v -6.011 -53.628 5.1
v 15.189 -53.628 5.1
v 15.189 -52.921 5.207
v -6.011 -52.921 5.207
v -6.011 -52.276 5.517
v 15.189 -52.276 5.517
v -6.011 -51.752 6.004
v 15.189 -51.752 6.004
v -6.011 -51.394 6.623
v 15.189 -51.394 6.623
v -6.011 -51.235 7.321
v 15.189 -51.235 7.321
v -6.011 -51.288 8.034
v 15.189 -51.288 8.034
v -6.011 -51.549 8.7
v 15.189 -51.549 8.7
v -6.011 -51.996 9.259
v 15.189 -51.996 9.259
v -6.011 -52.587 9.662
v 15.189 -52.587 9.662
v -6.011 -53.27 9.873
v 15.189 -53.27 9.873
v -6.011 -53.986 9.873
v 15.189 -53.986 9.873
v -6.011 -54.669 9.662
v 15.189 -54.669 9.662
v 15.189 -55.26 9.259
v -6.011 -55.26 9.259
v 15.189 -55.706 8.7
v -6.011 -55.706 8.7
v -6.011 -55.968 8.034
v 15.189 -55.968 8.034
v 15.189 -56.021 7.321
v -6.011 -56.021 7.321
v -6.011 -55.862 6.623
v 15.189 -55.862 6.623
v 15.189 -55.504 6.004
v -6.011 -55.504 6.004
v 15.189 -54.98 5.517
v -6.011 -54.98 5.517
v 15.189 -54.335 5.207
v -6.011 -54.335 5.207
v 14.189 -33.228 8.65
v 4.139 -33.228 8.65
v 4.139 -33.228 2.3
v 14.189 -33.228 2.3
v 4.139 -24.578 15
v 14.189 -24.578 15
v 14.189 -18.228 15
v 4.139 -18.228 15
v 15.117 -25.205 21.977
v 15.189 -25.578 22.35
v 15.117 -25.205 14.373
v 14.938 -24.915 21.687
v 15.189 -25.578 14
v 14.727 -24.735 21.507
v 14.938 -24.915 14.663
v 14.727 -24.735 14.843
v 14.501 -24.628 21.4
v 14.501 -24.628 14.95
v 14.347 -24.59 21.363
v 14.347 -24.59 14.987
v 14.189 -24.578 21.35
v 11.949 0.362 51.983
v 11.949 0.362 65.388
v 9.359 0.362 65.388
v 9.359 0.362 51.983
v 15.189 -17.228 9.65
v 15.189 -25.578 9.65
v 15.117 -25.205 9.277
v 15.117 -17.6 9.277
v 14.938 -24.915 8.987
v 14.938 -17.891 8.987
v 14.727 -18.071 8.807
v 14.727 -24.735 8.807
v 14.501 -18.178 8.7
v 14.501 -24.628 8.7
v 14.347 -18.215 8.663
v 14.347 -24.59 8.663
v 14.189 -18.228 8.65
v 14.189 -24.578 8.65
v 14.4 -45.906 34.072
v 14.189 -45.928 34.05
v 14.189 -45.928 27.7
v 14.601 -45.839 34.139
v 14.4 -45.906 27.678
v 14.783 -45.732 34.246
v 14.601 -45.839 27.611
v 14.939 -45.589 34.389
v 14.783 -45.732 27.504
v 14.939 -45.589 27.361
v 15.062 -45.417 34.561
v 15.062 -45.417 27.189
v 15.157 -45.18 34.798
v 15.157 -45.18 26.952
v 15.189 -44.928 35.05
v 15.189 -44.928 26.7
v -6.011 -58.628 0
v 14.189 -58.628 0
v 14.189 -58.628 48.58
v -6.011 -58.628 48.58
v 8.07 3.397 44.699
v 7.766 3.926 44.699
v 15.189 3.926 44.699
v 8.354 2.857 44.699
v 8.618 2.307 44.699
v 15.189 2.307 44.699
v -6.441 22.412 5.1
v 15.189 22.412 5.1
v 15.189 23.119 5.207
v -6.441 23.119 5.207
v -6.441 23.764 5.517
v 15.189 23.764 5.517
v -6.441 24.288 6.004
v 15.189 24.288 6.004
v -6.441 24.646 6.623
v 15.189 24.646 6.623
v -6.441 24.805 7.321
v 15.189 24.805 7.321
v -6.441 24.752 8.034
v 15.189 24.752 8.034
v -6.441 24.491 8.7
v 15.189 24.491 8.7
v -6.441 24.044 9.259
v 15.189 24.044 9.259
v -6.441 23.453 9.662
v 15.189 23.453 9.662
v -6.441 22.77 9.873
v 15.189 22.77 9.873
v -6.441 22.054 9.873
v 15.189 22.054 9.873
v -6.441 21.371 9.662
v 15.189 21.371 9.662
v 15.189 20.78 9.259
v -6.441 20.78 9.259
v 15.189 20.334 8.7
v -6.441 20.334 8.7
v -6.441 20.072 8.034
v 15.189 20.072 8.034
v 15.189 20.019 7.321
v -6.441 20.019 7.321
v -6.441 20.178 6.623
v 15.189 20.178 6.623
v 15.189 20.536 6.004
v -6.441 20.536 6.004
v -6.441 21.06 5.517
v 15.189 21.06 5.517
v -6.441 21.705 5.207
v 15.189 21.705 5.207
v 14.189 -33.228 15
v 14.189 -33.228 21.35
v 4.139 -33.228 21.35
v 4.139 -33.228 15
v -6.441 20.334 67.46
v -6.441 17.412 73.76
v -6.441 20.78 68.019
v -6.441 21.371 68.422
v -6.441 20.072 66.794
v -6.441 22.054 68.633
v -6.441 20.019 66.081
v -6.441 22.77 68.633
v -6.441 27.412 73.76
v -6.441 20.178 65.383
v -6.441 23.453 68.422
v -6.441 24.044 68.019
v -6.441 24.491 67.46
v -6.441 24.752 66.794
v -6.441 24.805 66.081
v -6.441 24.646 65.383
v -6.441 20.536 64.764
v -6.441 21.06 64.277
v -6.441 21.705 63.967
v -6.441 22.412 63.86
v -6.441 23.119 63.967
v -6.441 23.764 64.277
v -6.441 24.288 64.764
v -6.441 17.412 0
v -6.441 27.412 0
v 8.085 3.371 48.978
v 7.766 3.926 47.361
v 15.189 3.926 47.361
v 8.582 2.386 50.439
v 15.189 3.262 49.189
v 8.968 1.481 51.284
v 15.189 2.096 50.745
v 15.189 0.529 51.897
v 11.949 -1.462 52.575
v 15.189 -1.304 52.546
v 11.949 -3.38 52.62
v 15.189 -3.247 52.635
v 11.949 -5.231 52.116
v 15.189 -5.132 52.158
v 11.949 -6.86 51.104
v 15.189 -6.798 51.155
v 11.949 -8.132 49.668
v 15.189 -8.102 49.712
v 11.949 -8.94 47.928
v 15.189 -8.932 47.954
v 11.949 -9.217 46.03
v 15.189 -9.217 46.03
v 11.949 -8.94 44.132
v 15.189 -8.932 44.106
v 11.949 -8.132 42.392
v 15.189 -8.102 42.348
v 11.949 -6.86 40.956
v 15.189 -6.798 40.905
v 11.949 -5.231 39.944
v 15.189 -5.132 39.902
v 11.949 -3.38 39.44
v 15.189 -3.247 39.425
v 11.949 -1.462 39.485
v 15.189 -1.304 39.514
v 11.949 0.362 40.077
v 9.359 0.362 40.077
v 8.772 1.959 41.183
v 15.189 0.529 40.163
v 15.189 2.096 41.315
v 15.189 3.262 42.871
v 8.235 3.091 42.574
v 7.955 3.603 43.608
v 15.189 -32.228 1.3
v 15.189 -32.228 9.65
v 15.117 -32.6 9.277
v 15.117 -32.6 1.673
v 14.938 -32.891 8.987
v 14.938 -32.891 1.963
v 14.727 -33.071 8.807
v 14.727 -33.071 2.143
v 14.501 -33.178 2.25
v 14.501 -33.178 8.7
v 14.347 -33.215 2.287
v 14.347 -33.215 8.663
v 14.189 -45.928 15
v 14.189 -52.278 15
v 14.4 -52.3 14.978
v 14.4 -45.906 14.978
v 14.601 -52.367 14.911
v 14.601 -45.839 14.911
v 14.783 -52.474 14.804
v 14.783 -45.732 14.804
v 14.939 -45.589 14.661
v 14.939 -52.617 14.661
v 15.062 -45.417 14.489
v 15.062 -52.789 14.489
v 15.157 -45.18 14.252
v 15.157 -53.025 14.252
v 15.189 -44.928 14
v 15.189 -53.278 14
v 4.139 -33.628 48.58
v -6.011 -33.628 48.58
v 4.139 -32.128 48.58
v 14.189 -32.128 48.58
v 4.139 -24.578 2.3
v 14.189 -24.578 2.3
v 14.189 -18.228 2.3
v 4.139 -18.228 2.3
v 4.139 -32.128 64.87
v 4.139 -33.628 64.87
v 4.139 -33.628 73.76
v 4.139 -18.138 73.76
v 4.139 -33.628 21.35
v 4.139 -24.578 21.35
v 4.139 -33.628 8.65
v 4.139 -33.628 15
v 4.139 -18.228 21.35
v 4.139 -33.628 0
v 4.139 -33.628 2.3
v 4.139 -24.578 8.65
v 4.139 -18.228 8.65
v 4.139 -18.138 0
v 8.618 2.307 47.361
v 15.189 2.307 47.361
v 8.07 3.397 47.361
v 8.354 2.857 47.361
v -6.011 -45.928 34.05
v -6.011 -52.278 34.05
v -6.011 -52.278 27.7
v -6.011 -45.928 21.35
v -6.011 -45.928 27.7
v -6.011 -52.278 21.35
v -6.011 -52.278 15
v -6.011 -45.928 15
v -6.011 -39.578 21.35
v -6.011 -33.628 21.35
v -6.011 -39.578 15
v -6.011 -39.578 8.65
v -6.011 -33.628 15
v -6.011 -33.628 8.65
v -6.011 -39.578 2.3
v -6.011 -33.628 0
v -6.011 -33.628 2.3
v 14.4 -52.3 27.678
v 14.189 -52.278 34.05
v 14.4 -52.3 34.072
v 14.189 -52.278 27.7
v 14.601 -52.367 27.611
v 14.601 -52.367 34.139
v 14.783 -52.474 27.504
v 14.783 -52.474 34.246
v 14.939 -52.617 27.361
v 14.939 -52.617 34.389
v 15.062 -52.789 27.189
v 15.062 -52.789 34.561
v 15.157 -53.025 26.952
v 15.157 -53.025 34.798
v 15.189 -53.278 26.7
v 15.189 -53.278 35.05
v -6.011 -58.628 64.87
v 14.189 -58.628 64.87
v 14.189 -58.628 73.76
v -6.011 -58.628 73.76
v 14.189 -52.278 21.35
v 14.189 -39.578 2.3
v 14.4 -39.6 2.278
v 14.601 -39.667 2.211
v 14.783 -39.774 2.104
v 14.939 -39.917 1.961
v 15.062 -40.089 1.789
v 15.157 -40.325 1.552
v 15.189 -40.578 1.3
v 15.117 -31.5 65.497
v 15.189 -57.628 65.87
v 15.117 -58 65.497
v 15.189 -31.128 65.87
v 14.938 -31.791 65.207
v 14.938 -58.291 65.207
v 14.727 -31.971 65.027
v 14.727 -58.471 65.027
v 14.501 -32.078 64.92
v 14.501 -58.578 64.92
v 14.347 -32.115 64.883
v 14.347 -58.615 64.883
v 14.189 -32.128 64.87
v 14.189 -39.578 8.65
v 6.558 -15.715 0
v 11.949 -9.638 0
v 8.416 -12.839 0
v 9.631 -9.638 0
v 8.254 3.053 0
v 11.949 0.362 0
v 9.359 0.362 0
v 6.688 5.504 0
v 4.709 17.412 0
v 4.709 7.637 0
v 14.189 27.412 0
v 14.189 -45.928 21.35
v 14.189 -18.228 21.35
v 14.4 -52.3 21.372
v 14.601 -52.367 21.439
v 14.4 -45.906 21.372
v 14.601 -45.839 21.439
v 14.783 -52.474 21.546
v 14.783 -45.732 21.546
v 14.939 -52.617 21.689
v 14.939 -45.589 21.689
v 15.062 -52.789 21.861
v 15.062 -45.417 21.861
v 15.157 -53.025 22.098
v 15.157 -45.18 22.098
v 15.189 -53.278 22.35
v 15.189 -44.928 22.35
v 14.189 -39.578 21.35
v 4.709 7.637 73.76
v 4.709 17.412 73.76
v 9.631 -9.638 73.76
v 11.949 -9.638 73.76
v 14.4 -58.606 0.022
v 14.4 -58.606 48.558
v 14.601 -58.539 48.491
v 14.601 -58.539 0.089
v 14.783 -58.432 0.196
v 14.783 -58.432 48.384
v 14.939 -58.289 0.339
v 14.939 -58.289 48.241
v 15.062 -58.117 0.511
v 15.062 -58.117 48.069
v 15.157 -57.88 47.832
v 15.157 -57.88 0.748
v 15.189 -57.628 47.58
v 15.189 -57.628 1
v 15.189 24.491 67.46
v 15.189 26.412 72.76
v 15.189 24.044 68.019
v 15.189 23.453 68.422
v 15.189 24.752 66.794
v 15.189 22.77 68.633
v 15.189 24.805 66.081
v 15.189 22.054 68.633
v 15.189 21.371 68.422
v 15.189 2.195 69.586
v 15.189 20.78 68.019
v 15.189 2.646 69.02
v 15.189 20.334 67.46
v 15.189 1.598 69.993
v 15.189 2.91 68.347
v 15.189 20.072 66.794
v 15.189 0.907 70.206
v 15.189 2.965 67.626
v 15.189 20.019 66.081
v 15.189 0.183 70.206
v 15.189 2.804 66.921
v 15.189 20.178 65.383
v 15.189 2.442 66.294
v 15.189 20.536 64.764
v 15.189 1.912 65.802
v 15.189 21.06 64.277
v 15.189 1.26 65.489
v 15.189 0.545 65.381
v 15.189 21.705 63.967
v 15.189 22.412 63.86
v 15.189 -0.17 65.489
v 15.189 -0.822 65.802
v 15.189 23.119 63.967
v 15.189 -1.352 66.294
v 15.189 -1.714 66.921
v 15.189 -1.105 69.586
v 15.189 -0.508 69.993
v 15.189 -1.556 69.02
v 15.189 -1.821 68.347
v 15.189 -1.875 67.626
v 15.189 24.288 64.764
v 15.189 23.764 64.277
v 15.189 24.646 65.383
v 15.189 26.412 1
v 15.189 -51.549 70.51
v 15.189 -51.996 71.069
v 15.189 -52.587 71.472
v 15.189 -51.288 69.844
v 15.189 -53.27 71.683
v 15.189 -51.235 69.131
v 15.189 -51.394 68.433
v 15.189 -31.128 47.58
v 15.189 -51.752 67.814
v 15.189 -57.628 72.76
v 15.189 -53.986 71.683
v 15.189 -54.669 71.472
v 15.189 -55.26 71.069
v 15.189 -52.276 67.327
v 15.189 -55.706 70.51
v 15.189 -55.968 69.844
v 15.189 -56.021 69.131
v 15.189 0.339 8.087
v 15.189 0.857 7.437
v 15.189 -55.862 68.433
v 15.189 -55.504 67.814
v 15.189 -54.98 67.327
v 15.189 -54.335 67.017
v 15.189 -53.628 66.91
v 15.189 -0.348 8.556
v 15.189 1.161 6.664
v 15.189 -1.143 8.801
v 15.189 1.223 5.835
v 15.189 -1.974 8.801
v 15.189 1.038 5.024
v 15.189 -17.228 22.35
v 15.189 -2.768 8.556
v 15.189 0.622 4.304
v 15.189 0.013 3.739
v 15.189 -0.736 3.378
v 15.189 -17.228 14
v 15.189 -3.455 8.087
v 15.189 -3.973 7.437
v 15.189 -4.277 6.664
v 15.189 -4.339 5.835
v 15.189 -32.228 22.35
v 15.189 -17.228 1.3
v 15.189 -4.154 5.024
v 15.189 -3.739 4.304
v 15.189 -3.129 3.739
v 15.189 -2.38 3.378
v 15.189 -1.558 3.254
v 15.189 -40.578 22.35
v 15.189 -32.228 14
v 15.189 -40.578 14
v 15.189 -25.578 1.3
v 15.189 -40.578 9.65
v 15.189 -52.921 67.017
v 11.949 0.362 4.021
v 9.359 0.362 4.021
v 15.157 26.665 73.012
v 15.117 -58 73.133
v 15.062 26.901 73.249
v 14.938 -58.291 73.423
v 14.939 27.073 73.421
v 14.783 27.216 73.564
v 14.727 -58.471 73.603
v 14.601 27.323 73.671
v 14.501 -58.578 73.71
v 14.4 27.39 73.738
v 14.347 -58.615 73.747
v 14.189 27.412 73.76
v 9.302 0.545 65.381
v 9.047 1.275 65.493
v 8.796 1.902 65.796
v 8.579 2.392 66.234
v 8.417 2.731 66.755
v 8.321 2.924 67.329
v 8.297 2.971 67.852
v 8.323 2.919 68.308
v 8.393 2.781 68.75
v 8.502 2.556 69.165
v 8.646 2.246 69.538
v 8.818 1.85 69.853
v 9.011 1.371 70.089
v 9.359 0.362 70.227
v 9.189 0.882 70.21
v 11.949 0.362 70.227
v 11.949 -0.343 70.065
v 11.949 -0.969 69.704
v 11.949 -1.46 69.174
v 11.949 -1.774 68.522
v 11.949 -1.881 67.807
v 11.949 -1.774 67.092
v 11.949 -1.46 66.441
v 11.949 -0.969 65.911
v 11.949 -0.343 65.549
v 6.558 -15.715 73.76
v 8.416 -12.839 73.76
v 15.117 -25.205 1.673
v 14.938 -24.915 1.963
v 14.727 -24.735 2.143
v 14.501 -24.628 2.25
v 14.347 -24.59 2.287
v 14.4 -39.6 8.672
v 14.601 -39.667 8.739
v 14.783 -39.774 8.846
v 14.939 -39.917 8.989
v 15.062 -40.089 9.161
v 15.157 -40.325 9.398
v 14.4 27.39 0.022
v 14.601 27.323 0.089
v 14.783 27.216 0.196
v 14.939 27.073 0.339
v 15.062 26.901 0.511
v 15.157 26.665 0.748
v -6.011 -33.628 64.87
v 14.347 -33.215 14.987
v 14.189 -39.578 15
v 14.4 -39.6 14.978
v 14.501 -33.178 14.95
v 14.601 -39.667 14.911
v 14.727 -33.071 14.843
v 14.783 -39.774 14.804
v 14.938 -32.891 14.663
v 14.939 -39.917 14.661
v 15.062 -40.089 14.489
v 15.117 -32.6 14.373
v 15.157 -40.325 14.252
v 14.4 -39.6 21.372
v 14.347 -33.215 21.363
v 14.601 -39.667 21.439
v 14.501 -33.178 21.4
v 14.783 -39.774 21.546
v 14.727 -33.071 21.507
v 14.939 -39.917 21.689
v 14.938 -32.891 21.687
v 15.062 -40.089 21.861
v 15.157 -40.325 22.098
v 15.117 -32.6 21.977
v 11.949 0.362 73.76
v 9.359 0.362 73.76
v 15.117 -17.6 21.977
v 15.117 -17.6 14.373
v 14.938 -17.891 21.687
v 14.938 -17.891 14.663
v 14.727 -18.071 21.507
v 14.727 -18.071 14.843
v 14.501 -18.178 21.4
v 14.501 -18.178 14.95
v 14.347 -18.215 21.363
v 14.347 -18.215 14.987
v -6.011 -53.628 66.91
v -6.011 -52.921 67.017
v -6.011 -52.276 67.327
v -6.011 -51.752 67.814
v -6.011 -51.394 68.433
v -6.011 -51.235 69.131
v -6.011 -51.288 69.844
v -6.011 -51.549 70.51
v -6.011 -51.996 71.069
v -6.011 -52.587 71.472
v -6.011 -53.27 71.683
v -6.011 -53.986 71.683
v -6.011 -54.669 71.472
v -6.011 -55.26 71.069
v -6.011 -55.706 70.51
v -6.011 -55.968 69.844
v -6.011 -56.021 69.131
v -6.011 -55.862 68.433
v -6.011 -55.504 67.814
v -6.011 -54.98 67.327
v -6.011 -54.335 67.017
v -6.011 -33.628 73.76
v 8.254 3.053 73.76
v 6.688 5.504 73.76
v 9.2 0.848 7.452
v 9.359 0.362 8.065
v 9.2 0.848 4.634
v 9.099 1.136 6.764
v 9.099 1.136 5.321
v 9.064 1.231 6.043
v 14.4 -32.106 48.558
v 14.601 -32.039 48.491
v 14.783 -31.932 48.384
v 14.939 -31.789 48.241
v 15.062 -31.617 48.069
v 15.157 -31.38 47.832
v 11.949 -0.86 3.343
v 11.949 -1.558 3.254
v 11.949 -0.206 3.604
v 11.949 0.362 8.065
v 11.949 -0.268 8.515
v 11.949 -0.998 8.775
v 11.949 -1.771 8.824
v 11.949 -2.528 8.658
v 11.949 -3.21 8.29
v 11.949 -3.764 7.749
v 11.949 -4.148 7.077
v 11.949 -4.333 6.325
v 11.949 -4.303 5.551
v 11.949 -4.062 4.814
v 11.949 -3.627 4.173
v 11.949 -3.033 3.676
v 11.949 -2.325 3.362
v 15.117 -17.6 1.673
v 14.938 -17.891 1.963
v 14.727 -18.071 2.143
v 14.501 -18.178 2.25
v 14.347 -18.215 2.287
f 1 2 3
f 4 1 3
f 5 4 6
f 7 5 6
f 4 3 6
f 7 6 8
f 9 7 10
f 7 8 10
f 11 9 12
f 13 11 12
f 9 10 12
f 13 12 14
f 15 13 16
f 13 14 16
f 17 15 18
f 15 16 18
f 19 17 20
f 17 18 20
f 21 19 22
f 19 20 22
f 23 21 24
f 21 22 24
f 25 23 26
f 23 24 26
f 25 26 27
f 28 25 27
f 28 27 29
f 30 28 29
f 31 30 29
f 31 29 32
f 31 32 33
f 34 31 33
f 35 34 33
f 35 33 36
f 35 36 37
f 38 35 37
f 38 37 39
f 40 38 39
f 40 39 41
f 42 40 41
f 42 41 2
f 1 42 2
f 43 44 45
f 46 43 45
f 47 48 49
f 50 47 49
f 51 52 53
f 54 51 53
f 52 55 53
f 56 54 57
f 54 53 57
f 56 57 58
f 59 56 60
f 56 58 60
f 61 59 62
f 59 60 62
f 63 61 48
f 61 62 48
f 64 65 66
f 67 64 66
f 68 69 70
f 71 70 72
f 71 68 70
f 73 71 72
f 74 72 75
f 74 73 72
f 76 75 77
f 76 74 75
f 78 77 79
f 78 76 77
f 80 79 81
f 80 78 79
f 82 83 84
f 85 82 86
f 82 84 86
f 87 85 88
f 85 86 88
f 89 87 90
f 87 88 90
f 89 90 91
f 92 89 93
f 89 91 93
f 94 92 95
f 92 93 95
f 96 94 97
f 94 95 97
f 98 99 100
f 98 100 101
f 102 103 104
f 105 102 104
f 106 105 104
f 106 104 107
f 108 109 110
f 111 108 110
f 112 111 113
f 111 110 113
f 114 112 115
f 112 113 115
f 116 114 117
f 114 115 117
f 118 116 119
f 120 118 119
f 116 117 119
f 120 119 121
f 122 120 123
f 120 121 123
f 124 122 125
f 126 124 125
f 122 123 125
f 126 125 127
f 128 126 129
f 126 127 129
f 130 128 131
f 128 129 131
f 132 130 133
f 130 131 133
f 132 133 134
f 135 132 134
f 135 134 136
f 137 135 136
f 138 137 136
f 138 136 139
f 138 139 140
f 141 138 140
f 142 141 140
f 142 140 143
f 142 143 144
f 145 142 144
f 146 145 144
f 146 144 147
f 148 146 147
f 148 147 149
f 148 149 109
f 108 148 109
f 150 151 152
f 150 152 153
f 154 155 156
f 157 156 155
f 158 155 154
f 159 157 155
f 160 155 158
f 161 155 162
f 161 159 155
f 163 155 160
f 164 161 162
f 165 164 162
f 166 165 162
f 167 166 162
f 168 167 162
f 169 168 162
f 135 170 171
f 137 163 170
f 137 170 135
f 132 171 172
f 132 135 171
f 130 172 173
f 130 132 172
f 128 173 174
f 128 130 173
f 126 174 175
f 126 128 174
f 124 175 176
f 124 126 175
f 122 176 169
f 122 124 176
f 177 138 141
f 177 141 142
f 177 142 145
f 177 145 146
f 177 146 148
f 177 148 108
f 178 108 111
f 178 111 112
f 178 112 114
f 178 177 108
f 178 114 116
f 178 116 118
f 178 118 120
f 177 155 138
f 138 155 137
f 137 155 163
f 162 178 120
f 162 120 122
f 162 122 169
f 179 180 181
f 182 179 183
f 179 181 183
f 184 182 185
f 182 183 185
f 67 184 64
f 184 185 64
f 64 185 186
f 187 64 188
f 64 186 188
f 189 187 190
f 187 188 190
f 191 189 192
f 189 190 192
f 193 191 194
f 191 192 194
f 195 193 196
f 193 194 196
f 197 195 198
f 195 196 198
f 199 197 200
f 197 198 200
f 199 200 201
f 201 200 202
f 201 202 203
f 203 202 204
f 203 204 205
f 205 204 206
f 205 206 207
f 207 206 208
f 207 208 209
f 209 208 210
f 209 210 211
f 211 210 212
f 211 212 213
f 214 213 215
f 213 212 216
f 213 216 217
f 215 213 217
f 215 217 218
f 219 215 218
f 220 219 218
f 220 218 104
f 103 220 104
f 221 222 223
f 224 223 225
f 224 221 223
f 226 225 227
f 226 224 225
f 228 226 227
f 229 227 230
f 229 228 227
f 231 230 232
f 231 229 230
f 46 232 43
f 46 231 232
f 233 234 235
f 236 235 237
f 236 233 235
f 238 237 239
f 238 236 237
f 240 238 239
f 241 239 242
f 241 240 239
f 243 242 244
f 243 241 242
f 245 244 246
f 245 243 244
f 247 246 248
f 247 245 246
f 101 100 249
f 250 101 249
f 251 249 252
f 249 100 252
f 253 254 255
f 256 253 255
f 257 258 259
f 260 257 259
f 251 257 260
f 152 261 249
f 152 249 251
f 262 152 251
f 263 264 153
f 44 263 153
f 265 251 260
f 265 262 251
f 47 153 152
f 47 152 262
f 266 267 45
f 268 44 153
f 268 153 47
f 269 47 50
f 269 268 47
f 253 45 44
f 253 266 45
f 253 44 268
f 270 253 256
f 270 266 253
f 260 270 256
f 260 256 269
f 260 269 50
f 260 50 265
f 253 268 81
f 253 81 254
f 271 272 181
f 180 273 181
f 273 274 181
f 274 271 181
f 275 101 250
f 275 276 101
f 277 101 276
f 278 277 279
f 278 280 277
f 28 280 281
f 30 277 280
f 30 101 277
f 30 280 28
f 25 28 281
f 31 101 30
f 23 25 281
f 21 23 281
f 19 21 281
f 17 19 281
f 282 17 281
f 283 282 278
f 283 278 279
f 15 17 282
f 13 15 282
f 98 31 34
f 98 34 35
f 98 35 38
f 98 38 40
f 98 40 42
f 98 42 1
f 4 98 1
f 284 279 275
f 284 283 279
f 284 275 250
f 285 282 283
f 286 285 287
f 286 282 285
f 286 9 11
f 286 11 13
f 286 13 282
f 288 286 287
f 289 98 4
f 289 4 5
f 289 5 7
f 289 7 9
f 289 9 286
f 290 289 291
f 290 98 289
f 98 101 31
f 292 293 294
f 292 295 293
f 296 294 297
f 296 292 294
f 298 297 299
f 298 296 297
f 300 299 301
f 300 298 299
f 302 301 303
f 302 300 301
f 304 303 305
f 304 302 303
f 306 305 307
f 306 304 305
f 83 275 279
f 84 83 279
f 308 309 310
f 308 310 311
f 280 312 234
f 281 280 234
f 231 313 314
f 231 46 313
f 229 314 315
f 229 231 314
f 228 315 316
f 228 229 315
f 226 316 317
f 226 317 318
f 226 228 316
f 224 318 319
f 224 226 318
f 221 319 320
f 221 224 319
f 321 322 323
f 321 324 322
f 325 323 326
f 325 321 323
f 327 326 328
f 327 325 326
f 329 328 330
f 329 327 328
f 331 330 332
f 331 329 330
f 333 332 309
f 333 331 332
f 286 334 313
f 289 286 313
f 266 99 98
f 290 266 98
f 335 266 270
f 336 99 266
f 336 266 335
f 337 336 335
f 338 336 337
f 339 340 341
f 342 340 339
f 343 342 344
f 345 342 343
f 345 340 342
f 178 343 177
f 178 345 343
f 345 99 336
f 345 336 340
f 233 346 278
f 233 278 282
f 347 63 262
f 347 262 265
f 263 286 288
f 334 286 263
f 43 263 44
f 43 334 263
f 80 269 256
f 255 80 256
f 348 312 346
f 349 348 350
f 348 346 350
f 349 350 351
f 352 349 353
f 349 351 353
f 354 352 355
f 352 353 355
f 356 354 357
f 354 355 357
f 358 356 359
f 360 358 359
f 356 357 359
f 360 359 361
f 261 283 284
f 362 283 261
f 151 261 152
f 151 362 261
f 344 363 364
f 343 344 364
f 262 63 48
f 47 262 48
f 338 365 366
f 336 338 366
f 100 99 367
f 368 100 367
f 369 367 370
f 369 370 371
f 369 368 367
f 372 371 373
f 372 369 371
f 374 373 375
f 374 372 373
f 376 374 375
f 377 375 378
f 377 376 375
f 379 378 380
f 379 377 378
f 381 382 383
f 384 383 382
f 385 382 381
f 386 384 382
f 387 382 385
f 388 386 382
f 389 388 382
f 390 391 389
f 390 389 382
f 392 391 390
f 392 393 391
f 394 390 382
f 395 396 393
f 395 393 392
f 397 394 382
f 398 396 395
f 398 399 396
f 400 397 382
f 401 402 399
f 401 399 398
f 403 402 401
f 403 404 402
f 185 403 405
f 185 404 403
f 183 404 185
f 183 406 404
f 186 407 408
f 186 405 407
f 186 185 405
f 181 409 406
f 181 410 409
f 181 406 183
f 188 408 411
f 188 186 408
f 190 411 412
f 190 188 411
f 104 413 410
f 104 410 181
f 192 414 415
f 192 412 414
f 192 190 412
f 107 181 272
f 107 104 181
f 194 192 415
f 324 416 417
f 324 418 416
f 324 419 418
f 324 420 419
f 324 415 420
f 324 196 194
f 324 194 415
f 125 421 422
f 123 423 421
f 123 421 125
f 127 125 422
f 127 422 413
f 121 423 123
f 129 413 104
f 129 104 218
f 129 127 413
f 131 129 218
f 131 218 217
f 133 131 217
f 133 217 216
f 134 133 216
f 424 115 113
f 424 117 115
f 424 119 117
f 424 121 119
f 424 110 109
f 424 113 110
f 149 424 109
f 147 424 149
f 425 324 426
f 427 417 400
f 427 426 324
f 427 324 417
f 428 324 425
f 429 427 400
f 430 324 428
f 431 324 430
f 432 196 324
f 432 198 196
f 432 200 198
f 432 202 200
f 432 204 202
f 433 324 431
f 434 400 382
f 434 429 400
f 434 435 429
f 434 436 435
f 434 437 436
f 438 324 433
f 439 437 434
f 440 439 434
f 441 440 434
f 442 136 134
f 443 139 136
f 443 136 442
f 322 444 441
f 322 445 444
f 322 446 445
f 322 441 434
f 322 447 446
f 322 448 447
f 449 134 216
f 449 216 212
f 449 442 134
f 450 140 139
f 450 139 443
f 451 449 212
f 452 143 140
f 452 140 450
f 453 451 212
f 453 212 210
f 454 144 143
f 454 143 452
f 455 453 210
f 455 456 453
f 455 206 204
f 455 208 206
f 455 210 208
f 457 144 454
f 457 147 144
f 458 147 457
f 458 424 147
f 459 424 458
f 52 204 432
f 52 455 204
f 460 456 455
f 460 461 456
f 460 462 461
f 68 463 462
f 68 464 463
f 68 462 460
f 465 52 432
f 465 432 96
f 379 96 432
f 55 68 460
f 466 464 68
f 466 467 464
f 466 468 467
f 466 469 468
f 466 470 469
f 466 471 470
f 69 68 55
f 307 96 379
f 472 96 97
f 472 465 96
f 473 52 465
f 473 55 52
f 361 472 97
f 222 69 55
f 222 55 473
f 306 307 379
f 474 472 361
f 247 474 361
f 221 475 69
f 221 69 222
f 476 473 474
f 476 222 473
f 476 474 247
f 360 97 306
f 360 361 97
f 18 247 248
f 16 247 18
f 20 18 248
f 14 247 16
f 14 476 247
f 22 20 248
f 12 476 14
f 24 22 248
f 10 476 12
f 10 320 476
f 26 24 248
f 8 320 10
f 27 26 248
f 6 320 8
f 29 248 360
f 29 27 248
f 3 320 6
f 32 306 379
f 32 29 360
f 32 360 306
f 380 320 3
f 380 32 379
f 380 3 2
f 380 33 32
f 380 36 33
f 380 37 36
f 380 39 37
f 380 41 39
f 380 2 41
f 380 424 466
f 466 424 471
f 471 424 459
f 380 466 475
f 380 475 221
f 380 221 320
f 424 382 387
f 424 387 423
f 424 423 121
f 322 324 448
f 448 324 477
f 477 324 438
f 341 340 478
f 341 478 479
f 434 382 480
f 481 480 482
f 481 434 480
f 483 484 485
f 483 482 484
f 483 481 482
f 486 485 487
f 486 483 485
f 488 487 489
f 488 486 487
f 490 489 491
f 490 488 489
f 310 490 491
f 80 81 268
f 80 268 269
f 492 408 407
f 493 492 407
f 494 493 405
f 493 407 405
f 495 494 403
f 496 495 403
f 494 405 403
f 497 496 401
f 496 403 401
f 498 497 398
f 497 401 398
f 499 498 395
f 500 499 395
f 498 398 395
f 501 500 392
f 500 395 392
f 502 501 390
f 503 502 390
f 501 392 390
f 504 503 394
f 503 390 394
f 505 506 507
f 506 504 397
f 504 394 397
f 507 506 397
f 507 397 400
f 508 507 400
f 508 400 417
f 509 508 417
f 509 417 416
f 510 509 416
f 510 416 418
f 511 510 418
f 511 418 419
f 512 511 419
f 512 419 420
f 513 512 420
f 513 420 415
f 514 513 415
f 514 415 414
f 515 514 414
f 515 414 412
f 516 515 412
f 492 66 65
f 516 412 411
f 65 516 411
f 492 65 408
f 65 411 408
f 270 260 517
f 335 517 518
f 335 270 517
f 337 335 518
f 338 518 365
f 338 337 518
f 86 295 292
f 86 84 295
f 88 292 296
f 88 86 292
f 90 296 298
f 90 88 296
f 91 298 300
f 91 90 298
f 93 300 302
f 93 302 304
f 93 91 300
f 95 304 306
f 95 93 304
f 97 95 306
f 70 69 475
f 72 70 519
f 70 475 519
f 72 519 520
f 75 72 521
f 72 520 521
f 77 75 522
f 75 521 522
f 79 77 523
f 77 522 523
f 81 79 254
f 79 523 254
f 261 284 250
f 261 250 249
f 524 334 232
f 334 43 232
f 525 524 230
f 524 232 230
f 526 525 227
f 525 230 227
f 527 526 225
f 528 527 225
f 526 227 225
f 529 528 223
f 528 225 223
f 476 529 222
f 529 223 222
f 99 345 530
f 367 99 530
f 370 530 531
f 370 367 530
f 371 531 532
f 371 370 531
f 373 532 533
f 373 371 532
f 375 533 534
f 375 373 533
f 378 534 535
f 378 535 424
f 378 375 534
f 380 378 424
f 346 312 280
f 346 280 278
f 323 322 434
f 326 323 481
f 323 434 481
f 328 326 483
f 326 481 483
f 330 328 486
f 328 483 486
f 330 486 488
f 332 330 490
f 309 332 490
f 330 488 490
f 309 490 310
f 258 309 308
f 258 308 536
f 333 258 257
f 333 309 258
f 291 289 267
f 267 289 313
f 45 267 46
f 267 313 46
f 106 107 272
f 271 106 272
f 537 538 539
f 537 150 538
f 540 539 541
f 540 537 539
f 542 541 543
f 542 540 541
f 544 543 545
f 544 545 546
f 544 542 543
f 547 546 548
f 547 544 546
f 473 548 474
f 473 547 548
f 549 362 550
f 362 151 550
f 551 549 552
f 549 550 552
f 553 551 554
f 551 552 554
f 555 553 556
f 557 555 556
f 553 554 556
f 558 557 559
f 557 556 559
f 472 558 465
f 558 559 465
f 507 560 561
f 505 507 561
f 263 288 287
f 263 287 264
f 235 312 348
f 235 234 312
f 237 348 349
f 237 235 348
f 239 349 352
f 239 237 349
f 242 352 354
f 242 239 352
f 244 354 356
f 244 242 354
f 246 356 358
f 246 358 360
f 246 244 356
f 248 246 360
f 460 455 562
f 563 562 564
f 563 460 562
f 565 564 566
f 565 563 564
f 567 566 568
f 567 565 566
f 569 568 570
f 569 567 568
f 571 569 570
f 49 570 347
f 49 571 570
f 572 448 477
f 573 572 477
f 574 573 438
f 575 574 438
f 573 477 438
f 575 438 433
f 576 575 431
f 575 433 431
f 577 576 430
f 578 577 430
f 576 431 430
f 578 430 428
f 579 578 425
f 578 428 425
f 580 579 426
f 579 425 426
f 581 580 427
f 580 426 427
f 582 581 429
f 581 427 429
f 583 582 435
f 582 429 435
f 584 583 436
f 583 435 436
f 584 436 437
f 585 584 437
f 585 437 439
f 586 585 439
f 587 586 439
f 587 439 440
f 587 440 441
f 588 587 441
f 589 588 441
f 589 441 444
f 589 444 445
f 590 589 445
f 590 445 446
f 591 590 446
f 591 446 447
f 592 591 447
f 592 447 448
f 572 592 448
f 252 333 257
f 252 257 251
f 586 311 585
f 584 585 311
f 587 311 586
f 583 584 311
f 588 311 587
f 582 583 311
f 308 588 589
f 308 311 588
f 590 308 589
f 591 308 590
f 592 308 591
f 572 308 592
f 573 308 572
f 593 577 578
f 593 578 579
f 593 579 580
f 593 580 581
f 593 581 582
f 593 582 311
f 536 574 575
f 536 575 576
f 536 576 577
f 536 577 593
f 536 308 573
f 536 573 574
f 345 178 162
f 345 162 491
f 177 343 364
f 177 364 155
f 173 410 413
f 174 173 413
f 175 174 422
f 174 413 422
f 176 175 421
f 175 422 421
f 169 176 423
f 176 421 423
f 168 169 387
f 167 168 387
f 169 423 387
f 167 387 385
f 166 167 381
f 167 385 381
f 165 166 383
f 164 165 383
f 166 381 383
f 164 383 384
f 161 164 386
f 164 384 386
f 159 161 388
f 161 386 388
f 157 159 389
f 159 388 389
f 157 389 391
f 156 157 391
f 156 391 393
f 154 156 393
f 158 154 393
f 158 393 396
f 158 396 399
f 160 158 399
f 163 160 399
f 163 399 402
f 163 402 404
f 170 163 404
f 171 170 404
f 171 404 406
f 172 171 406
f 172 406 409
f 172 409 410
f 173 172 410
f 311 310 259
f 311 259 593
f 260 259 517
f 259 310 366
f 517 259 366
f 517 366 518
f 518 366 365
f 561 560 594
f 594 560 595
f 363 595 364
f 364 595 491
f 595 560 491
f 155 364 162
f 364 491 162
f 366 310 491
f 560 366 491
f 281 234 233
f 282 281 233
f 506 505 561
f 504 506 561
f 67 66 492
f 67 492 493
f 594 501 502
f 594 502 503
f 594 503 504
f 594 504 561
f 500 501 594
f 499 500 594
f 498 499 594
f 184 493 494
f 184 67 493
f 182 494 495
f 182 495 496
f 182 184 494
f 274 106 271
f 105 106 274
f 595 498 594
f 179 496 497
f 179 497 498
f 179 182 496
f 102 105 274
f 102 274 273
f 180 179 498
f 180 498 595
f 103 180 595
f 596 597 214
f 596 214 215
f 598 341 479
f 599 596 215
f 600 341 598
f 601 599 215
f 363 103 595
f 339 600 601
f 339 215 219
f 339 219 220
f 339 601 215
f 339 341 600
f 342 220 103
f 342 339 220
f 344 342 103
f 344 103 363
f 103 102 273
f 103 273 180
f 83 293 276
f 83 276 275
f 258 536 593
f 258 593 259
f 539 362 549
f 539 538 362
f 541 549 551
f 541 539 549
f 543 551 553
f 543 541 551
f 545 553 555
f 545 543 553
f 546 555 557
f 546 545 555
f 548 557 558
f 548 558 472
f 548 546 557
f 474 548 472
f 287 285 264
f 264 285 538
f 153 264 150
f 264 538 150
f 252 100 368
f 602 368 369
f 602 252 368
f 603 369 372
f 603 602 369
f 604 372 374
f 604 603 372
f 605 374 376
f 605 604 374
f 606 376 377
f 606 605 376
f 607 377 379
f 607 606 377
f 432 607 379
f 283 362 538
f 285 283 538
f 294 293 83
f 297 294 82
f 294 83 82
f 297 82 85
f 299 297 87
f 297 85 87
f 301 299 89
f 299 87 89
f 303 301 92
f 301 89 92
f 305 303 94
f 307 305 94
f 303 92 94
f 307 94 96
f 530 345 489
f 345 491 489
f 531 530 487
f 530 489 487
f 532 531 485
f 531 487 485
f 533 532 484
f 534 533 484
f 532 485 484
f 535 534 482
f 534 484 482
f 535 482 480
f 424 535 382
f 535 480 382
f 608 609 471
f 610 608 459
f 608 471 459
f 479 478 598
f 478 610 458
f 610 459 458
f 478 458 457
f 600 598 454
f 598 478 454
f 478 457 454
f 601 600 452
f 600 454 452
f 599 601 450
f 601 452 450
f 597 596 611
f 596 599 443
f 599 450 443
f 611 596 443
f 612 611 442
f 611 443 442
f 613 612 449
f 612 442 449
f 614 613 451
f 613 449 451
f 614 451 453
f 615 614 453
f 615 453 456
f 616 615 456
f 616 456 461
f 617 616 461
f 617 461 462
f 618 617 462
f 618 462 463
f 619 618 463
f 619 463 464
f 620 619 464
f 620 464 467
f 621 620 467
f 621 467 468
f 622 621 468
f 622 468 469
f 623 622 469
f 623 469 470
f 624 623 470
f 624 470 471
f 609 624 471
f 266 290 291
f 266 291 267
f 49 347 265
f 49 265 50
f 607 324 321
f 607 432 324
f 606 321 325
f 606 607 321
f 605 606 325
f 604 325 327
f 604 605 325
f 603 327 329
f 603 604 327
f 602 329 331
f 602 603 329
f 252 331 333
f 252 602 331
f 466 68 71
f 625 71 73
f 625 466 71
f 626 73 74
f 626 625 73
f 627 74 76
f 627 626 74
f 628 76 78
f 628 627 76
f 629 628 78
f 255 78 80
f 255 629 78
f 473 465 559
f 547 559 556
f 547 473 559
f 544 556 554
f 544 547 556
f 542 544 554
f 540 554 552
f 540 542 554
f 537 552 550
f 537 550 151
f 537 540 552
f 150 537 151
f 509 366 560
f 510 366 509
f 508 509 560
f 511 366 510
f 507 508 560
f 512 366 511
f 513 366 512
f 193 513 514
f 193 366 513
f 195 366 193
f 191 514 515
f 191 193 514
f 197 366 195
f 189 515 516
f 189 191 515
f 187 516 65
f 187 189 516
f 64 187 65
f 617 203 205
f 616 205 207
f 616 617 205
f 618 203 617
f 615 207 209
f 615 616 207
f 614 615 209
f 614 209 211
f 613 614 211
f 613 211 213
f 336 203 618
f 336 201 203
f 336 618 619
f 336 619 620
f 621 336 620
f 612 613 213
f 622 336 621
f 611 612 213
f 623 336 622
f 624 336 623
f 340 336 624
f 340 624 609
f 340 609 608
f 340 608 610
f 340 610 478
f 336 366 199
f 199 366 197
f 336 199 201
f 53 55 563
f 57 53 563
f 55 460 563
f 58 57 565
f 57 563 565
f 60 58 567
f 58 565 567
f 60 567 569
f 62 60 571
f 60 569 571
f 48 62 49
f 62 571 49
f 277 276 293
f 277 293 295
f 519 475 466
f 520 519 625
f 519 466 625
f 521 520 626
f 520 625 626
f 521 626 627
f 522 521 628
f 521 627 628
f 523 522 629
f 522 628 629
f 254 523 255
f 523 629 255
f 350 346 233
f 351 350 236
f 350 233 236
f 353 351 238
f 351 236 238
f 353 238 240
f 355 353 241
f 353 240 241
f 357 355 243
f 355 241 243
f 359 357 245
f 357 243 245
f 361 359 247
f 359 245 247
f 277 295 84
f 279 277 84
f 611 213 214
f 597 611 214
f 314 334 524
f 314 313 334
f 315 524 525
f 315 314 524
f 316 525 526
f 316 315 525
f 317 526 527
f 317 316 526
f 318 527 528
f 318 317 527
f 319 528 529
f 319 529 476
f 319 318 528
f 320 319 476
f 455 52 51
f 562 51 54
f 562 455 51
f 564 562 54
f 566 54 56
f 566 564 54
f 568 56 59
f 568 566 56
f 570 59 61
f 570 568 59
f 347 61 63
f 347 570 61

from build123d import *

# Parameters (mm, degrees)
PROFILEEXTRUDE_DEPTH = 73.76
HOSEWINDOW_W         = 16.29
HOSEWINDOW_H         = 26.5
HOSEWINDOWCUT_DEPTH  = 22.63
CAGESCREWS_R         = 2.4
CAGESCREWSCUT_DEPTH  = 22.63
AXLEHOLECUT_DEPTH    = 22.63
SETSCREWS_R          = 2.426338021
SETSCREWS_R_2        = 2.788762315
SETSCREWSCUT_DEPTH   = 22.63
SKETCH1_W            = 6.35
SKETCH1_H            = 6.35
CUT_EXTRUDE1_DEPTH   = 22.63
FILLET1_R            = 1


with BuildPart() as part:
    # Profile → ProfileExtrude (new body)
    with BuildSketch(Plane.XY):
        with BuildLine():
            Line((-6.01073477, -58.62791746), (-6.01073477, -33.62791746))
            Line((-6.01073477, -33.62791746), (4.13926523, -33.62791746))
            Line((4.13926523, -33.62791746), (4.13926523, -18.13791746))
            ThreePointArc((4.13926523, -18.13791746), (7.563334043, -14.326029686), (9.63126523, -9.63791746))
            Line((9.63126523, -9.63791746), (11.94926523, -9.63791746))
            Line((11.94926523, -9.63791746), (11.94926523, 0.36208254))
            Line((11.94926523, 0.36208254), (9.35926523, 0.36208254))
            ThreePointArc((9.35926523, 0.36208254), (7.525939238, 4.313848402), (4.70926523, 7.63708254))
            Line((4.70926523, 7.63708254), (4.70926523, 17.41208254))
            Line((4.70926523, 17.41208254), (-6.44073477, 17.41208254))
            Line((-6.44073477, 17.41208254), (-6.44073477, 27.41208254))
            Line((-6.44073477, 27.41208254), (15.18926523, 27.41208254))
            Line((15.18926523, 27.41208254), (15.18926523, -58.62791746))
            Line((15.18926523, -58.62791746), (-6.01073477, -58.62791746))
        make_face()
    extrude(amount=PROFILEEXTRUDE_DEPTH)

    # HoseWindow → HoseWindowCut (cut, through all)
    with BuildSketch(Plane(origin=(15.18926523, 0, 0), x_dir=(0, 0, -1), z_dir=(1, 0, 0))):
        with Locations((-56.725, -45.37791746)):
            Rectangle(HOSEWINDOW_W, HOSEWINDOW_H)
    extrude(amount=-HOSEWINDOWCUT_DEPTH, mode=Mode.SUBTRACT)

    # CageScrews → CageScrewsCut (cut, through all)
    with BuildSketch(Plane(origin=(15.18926523, 0, 0), x_dir=(0, 0, -1), z_dir=(1, 0, 0))):
        with Locations((-66.26, 22.41208254)):
            Circle(CAGESCREWS_R)
        with Locations((-7.5, 22.41208254)):
            Circle(CAGESCREWS_R)
        with Locations((-7.5, -53.62791746)):
            Circle(CAGESCREWS_R)
        with Locations((-69.31, -53.62791746)):
            Circle(CAGESCREWS_R)
    extrude(amount=-CAGESCREWSCUT_DEPTH, mode=Mode.SUBTRACT)

    # AxleHole → AxleHoleCut (cut, through all)
    with BuildSketch(Plane(origin=(15.18926523, 0, 0), x_dir=(0, 0, -1), z_dir=(1, 0, 0))):
        with BuildLine():
            Line((-44.699, 2.307293484), (-47.361, 2.307293484))
            Line((-47.361, 2.307293484), (-47.361, 3.926293484))
            ThreePointArc((-47.361, 3.926293484), (-46.03, -9.21691746), (-44.699, 3.926293484))
            Line((-44.699, 3.926293484), (-44.699, 2.307293484))
        make_face()
    extrude(amount=-AXLEHOLECUT_DEPTH, mode=Mode.SUBTRACT)

    # SetScrews → SetScrewsCut (cut, through all)
    with BuildSketch(Plane(origin=(15.18926523, 0, 0), x_dir=(0, 0, -1), z_dir=(1, 0, 0))):
        with Locations((-67.80722939, 0.544946624)):
            Circle(SETSCREWS_R)
        with Locations((-6.04299884, -1.55824191)):
            Circle(SETSCREWS_R_2)
    extrude(amount=-SETSCREWSCUT_DEPTH, mode=Mode.SUBTRACT)

    # Sketch1 → Cut-Extrude1 (cut, through all)
    with BuildSketch(Plane(origin=(15.18926523, 0, 0), x_dir=(0, 0, -1), z_dir=(1, 0, 0))):
        with Locations((-18.175, -49.10291746)):
            Rectangle(SKETCH1_W, SKETCH1_H)
        with Locations((-30.875, -49.10291746)):
            Rectangle(SKETCH1_W, SKETCH1_H)
        with Locations((-5.475, -36.40291746)):
            Rectangle(SKETCH1_W, SKETCH1_H)
        with Locations((-18.175, -36.40291746)):
            Rectangle(SKETCH1_W, SKETCH1_H)
        with Locations((-5.475, -21.40291746)):
            Rectangle(SKETCH1_W, SKETCH1_H)
        with Locations((-18.175, -21.40291746)):
            Rectangle(SKETCH1_W, SKETCH1_H)
    extrude(amount=-CUT_EXTRUDE1_DEPTH, mode=Mode.SUBTRACT)

    # Fillet1
    fillet1_edges = [part.edges().sort_by_distance(p)[0] for p in [
        (15.18926523, -45.92791746, 18.175),
        (15.18926523, -49.10291746, 21.35),
        (15.18926523, -52.27791746, 18.175),
        (15.18926523, -49.10291746, 15),
        (15.18926523, -45.92791746, 30.875),
        (15.18926523, -49.10291746, 34.05),
        (15.18926523, -52.27791746, 30.875),
        (15.18926523, -49.10291746, 27.7),
        (15.18926523, -33.22791746, 5.475),
        (15.18926523, -36.40291746, 8.65),
        (15.18926523, -39.57791746, 5.475),
        (15.18926523, -36.40291746, 2.3),
        (15.18926523, -15.60791746, 0),
        (15.18926523, -33.22791746, 18.175),
        (15.18926523, -36.40291746, 21.35),
        (15.18926523, -39.57791746, 18.175),
        (15.18926523, -36.40291746, 15),
        (15.18926523, -18.22791746, 5.475),
        (15.18926523, -21.40291746, 8.65),
        (15.18926523, -24.57791746, 5.475),
        (15.18926523, -21.40291746, 2.3),
        (15.18926523, -18.22791746, 18.175),
        (15.18926523, -21.40291746, 21.35),
        (15.18926523, -24.57791746, 18.175),
        (15.18926523, -21.40291746, 15),
        (15.18926523, -58.62791746, 69.315),
        (15.18926523, 27.41208254, 36.88),
        (15.18926523, -58.62791746, 24.29),
        (15.18926523, -15.60791746, 73.76),
        (15.18926523, -45.37791746, 64.87),
        (15.18926523, -45.37791746, 48.58),
        (15.18926523, -32.12791746, 56.725),
    ]]
    fillet(fillet1_edges, radius=FILLET1_R)


solid = part.part
